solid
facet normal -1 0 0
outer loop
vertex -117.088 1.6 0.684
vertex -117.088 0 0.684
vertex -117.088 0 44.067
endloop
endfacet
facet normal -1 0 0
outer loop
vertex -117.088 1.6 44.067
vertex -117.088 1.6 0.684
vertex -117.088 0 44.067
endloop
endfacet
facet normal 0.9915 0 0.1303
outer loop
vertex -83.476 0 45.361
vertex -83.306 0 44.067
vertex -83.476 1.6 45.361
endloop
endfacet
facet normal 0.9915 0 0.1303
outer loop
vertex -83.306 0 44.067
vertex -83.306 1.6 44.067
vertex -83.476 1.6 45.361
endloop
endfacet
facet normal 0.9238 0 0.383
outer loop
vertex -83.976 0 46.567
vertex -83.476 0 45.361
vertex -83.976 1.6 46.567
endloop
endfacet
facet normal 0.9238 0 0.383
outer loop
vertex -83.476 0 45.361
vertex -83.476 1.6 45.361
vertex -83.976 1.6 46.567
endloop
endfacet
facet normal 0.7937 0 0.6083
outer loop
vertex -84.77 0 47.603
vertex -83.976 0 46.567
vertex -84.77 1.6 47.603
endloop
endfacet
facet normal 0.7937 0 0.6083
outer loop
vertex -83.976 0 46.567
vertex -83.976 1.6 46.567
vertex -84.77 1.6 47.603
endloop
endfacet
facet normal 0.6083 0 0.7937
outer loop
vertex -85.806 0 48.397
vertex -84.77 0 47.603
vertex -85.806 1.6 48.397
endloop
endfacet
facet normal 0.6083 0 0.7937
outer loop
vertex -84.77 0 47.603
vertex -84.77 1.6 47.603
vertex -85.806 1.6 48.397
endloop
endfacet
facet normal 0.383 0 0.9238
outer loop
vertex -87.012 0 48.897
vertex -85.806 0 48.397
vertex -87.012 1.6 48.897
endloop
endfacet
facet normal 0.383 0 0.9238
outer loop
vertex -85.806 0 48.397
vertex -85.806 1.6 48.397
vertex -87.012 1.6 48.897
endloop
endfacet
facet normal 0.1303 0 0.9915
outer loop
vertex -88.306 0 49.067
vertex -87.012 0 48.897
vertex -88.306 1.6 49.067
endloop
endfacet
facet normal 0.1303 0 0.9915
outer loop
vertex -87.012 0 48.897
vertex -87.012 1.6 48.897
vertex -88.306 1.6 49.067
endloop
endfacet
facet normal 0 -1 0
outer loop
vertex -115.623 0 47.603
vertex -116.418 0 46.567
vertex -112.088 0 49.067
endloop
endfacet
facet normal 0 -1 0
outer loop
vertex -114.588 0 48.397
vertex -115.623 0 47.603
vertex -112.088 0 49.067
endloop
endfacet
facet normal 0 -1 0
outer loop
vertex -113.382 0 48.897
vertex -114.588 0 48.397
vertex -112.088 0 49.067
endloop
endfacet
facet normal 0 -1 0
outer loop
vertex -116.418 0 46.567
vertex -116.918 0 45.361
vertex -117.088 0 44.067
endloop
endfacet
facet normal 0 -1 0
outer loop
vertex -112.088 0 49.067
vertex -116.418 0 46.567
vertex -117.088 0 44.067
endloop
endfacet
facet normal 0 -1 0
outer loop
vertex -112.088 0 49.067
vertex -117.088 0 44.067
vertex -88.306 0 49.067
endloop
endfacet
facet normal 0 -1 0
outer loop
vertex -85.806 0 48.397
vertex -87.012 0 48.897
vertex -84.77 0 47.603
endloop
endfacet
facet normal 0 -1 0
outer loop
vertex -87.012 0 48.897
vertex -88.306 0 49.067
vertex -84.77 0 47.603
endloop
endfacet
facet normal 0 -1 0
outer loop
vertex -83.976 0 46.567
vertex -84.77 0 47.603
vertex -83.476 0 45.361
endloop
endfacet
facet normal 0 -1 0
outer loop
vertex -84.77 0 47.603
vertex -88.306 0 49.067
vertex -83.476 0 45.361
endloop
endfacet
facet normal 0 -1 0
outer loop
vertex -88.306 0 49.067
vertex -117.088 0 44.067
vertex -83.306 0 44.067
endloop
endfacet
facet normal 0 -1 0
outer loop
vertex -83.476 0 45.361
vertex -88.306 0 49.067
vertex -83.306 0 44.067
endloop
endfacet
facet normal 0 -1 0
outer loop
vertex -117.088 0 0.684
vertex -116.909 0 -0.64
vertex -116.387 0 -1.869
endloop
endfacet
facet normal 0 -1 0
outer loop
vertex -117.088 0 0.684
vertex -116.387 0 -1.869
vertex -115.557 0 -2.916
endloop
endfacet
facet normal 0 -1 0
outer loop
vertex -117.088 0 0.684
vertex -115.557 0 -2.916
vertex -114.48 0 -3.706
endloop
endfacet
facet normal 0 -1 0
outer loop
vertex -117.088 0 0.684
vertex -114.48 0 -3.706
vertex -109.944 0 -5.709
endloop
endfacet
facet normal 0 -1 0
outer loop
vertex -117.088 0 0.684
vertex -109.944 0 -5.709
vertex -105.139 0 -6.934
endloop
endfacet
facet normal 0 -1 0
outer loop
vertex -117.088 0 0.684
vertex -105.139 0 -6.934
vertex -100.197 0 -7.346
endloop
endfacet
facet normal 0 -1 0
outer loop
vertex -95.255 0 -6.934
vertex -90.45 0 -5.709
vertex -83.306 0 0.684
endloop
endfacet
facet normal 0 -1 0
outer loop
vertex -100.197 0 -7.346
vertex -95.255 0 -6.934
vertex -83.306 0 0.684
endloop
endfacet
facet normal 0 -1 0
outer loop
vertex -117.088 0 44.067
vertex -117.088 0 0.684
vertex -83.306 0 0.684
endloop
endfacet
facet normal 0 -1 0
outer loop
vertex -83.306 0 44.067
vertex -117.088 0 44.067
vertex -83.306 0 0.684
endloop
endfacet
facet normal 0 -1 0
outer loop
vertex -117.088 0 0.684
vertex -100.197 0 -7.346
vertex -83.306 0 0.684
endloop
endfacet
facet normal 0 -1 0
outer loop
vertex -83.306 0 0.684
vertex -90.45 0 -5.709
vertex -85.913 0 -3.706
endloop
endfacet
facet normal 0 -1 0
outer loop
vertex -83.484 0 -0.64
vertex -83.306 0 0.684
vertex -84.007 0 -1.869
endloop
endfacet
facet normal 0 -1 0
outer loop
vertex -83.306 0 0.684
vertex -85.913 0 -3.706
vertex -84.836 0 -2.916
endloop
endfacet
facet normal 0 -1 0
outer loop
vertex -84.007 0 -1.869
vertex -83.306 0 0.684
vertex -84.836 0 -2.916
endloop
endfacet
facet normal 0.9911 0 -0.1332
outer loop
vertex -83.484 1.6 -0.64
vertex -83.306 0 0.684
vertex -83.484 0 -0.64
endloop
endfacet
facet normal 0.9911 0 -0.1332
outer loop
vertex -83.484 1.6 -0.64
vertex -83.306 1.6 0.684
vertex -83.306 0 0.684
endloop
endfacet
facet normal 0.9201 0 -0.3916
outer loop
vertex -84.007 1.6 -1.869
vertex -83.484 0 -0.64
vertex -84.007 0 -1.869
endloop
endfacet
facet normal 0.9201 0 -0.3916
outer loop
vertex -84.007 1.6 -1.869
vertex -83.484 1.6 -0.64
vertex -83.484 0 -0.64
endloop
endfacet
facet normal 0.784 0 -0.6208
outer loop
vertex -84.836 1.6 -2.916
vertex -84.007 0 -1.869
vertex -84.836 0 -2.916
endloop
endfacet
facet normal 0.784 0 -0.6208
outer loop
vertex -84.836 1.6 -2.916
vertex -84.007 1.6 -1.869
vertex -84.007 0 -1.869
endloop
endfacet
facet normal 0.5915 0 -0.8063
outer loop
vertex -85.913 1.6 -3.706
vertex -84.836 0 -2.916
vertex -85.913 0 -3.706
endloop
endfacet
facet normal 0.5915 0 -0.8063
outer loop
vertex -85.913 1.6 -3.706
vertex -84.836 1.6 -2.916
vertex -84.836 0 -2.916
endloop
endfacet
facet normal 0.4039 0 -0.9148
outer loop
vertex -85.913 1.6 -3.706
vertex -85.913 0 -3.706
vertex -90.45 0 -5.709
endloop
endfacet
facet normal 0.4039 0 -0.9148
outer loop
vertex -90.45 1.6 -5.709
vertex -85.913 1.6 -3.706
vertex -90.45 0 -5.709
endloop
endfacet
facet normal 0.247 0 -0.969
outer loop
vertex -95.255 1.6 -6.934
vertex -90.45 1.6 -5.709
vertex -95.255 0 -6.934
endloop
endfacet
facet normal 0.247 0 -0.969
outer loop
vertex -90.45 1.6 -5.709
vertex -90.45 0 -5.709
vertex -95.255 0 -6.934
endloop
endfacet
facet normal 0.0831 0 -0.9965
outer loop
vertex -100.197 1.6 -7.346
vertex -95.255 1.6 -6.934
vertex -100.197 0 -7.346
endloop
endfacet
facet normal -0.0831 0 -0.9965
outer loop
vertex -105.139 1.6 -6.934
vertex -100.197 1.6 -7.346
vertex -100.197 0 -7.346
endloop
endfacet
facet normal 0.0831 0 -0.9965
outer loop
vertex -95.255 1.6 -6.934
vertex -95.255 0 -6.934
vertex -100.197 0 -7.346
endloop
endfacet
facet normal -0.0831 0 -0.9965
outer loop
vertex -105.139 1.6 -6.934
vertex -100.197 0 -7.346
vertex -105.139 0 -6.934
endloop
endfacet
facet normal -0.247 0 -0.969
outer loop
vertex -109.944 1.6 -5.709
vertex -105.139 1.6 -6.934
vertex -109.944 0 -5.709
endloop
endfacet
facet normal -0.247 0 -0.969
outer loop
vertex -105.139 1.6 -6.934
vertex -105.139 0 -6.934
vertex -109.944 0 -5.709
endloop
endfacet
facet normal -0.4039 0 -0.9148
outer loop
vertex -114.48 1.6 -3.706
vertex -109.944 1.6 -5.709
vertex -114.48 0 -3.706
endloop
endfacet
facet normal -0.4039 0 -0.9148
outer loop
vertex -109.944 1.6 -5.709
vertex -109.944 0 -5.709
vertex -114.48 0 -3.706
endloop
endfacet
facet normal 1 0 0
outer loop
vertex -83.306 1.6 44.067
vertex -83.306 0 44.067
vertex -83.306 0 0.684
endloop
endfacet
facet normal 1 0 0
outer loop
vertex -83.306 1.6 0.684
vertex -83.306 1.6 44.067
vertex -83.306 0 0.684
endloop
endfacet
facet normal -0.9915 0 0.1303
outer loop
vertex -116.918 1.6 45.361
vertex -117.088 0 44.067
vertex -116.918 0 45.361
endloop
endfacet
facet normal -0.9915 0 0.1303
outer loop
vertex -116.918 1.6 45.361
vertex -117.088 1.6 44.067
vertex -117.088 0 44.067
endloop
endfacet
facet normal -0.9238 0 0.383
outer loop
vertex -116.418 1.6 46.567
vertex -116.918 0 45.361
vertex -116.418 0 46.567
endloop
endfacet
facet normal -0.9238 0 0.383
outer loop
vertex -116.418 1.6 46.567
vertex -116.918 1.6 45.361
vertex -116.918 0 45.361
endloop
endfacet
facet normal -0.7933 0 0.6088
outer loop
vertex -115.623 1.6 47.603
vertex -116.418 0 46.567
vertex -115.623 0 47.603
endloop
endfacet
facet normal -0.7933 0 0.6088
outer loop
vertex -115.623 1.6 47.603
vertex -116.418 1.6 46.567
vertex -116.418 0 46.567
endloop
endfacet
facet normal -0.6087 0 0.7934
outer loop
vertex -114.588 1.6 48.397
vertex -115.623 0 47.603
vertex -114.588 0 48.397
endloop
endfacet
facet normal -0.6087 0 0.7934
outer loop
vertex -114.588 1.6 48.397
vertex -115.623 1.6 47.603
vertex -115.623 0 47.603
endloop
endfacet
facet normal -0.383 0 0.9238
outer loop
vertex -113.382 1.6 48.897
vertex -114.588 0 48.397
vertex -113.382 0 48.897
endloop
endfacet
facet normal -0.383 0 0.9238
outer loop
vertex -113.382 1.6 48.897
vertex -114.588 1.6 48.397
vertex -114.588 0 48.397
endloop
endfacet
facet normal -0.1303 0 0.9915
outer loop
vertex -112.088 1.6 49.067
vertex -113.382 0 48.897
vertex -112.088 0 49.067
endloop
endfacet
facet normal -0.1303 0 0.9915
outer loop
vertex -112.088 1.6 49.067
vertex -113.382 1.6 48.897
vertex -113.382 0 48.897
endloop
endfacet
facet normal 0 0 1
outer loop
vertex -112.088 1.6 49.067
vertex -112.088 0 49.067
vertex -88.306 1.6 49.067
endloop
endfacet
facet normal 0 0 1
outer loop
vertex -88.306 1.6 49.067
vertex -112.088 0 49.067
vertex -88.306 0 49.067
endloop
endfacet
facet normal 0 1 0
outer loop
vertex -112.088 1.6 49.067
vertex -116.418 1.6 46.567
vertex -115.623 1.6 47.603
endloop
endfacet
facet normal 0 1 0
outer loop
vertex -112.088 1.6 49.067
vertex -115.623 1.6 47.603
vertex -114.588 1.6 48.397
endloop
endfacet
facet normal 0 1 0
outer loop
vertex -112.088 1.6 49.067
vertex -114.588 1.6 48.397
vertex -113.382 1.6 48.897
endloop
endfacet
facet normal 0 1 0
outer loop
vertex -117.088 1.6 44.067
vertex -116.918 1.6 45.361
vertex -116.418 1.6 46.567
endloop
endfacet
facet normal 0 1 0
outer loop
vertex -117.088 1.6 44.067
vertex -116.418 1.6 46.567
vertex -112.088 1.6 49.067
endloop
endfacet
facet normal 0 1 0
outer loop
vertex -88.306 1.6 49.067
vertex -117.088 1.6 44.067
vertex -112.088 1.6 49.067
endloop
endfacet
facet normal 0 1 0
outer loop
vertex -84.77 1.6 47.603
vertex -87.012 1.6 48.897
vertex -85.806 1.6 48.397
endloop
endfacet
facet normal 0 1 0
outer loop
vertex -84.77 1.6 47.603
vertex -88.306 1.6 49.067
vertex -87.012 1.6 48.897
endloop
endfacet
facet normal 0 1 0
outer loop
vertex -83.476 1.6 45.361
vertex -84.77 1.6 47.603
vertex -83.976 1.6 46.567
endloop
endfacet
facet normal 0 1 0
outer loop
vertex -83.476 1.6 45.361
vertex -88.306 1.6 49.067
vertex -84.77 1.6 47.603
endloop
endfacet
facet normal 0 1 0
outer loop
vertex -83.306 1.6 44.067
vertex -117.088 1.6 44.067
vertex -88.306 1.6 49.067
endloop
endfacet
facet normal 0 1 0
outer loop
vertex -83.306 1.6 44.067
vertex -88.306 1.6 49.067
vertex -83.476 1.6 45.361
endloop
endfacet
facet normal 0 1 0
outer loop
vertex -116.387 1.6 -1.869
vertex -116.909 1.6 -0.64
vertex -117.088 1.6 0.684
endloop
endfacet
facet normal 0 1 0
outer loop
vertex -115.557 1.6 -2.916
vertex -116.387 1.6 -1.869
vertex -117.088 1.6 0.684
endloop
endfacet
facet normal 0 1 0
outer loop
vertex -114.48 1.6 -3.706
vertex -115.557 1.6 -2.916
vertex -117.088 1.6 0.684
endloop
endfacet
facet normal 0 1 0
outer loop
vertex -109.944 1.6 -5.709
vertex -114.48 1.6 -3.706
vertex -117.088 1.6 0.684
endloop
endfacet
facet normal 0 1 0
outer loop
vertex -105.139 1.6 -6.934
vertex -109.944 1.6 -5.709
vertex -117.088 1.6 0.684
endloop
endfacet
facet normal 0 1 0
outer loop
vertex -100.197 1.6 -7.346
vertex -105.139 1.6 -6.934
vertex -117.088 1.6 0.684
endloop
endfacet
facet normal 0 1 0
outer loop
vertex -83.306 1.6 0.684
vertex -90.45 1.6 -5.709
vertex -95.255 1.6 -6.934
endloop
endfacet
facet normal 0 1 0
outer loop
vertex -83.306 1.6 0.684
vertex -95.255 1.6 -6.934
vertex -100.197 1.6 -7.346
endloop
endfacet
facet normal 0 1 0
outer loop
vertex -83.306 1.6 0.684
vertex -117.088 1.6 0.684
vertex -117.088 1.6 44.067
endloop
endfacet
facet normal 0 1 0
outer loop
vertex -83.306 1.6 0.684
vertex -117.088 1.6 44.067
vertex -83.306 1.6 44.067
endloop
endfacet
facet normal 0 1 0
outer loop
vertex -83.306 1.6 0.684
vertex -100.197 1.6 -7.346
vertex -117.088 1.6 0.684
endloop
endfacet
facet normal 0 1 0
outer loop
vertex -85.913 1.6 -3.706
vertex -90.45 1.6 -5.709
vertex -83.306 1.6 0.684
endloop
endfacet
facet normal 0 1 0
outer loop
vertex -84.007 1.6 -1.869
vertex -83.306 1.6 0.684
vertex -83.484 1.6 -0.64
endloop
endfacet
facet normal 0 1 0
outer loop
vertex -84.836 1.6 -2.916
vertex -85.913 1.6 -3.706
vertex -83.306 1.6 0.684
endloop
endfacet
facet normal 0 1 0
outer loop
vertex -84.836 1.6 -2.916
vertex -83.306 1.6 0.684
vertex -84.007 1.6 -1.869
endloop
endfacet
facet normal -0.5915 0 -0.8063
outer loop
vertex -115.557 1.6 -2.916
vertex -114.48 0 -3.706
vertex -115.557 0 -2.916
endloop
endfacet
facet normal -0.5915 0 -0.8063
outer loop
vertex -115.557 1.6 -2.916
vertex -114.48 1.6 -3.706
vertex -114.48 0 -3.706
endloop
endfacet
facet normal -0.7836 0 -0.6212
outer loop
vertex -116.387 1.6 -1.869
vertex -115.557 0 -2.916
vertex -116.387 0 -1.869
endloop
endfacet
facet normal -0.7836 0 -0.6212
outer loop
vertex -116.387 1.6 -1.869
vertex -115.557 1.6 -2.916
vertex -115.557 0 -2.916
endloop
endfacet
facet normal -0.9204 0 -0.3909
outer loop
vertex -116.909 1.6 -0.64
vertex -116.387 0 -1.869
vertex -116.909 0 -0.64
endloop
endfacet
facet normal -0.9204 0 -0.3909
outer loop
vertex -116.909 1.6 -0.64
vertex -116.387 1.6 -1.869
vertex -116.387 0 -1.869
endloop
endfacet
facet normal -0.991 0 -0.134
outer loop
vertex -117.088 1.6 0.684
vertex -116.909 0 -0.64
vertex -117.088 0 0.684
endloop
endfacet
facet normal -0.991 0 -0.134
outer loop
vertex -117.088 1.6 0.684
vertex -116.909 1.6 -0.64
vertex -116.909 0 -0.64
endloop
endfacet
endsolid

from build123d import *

# Parameters (mm, degrees)
BOSS_EXTRUDE1_DEPTH = 1.6
FILLET1_R           = 5


with BuildPart() as part:
    # Sketch2 → Boss-Extrude1 (new body)
    with BuildSketch(Plane(origin=(0, 0, 0), x_dir=(1, 0, 0), z_dir=(0, 1, 0))):
        with BuildLine():
            Line((-83.305877437, -49.06713814), (-83.305877437, 2.106985575))
            ThreePointArc((-83.305877437, 2.106985575), (-100.196877437, 7.345674781), (-117.087877437, 2.106985575))
            Line((-117.087877437, 2.106985575), (-117.087877437, -49.06713814))
            Line((-117.087877437, -49.06713814), (-83.305877437, -49.06713814))
        make_face()
    extrude(amount=BOSS_EXTRUDE1_DEPTH)

    # Fillet1
    fillet1_edges = [part.edges().sort_by_distance(p)[0] for p in [
        (-83.305877437, 0.8, -2.106985575),
        (-83.305877437, 0.8, 49.06713814),
        (-117.087877437, 0.8, 49.06713814),
        (-117.087877437, 0.8, -2.106985575),
    ]]
    fillet(fillet1_edges, radius=FILLET1_R)


solid = part.part
